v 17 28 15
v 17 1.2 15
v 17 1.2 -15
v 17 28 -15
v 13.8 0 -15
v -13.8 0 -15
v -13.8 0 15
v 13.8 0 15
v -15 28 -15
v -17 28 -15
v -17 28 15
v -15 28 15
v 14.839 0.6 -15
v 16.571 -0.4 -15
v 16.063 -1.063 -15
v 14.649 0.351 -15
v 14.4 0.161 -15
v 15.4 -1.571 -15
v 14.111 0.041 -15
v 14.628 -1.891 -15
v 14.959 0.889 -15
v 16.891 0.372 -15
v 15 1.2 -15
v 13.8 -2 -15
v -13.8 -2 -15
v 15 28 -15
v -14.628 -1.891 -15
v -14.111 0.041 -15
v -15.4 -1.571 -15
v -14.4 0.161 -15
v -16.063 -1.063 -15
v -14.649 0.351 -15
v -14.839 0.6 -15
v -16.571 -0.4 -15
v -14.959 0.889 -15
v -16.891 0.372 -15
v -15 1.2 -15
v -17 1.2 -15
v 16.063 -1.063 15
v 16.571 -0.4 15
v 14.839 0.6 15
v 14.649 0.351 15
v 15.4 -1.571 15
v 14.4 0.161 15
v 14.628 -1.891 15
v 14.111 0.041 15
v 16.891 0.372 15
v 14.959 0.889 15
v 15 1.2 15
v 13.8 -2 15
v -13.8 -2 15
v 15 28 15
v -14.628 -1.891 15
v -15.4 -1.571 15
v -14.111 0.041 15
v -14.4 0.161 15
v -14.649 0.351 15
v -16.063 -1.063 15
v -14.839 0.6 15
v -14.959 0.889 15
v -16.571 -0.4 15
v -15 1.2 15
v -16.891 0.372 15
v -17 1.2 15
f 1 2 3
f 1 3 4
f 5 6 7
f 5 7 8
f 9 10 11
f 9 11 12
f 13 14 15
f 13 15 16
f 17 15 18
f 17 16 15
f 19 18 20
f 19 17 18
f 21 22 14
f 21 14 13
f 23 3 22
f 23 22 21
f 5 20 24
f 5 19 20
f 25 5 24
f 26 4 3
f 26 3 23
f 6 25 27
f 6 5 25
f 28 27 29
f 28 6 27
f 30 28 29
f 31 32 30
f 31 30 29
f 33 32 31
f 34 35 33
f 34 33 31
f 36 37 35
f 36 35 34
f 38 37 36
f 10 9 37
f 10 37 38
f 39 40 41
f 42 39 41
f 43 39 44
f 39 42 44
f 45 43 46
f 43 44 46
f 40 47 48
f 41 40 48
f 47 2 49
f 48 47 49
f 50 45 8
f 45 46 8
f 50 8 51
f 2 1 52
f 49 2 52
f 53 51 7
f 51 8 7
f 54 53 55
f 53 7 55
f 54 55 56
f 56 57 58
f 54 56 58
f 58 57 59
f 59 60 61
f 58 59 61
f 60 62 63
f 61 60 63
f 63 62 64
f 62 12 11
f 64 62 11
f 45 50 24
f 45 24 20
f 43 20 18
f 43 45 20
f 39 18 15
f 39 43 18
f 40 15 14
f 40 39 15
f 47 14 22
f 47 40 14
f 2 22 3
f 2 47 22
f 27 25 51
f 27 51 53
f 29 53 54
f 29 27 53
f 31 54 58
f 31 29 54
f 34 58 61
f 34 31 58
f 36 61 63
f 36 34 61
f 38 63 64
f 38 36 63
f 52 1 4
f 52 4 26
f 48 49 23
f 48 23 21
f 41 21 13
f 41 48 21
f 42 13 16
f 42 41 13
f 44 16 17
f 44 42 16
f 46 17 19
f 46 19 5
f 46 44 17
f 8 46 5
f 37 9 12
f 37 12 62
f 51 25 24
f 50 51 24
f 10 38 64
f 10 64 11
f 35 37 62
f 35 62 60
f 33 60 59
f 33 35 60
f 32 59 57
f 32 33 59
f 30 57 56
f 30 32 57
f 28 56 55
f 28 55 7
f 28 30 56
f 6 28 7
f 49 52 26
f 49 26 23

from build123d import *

# Parameters (mm, degrees)
SKETCH1_W               = 27.6
SKETCH1_H               = 30
BASE_FLANGE1_DEPTH      = 2
EDGE_FLANGE1_DEPTH      = 30
EDGE_FLANGE1_BEND_DEPTH = 30


# Sheet-metal steps are written as plain solids
with BuildPart() as part:
    # Sketch1 → Base-Flange1 (new body)
    with BuildSketch(Plane(origin=(0, 0, 0), x_dir=(1, 0, 0), z_dir=(0, 1, 0))):
        Rectangle(SKETCH1_W, SKETCH1_H)
    extrude(amount=-BASE_FLANGE1_DEPTH)

    # Edge-Flange1 section (across the edge) → Edge-Flange1 (add)
    with BuildSketch(Plane(origin=(15, 0, 15), x_dir=(-1, 0, 0), z_dir=(0, 0, -1))):
        with BuildLine():
            Line((-2, 1.2), (-2, 28))
            Line((-2, 28), (0, 28))
            Line((0, 28), (0, 1.2))
            ThreePointArc((0, 1.2), (0.351471863, 0.351471863), (1.2, 0))
            Line((1.2, 0), (1.2, -2))
            ThreePointArc((1.2, -2), (-1.0627417, -1.0627417), (-2, 1.2))
        make_face()
    extrude(amount=EDGE_FLANGE1_DEPTH)

    # Edge-Flange1 section 2 (across the edge) → Edge-Flange1 bend (add)
    with BuildSketch(Plane(origin=(-15, 0, -15), x_dir=(1, 0, 0), z_dir=(0, 0, 1))):
        with BuildLine():
            Line((-2, 1.2), (-2, 28))
            Line((-2, 28), (0, 28))
            Line((0, 28), (0, 1.2))
            ThreePointArc((0, 1.2), (0.351471863, 0.351471863), (1.2, 0))
            Line((1.2, 0), (1.2, -2))
            ThreePointArc((1.2, -2), (-1.0627417, -1.0627417), (-2, 1.2))
        make_face()
    extrude(amount=EDGE_FLANGE1_BEND_DEPTH)


solid = part.part
